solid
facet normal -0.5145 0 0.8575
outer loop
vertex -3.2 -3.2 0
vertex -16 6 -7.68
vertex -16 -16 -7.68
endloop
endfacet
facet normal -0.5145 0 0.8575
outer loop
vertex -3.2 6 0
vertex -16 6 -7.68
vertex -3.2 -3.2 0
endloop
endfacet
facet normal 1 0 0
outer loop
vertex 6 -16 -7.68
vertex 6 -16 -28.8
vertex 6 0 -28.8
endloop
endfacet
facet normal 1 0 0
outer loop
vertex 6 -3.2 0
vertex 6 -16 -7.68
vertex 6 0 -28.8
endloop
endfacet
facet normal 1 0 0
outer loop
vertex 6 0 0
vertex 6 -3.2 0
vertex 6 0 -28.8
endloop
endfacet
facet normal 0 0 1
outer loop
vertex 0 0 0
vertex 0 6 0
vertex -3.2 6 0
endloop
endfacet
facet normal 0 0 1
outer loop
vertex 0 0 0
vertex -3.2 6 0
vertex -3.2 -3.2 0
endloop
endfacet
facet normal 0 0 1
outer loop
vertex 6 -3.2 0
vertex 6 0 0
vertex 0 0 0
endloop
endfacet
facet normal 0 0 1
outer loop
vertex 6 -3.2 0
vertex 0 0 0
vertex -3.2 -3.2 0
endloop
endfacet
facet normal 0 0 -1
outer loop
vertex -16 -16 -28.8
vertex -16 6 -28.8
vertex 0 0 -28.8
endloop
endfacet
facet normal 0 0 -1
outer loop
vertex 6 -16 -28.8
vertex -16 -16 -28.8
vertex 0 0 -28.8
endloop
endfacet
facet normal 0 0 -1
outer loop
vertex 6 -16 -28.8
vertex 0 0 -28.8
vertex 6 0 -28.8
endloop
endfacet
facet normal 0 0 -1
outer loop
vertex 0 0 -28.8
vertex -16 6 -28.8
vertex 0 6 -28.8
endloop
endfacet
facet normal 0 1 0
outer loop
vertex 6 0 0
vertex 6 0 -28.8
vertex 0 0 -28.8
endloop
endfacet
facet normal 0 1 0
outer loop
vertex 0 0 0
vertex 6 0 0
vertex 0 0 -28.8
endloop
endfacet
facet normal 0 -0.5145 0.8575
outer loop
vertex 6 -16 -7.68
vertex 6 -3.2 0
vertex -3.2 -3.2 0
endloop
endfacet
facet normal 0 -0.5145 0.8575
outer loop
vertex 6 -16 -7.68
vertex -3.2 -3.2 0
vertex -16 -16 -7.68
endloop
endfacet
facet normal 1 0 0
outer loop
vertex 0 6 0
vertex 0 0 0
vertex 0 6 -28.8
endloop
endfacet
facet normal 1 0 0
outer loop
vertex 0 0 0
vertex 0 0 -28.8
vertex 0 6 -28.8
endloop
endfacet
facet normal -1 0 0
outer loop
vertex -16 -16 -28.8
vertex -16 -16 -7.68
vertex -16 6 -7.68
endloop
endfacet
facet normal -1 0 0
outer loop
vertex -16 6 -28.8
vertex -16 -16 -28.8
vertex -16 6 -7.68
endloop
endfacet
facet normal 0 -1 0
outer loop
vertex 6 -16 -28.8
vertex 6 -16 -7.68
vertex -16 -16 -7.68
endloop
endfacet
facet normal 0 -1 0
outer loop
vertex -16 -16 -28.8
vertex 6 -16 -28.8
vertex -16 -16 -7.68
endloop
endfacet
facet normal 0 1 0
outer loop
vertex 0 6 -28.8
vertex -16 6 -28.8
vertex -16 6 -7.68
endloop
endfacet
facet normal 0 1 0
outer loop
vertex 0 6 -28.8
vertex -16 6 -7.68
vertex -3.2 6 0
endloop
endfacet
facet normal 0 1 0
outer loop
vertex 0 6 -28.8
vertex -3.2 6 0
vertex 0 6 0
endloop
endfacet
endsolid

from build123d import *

# Parameters (mm, degrees)
PAD014_DEPTH    = 28.8
POCKET011_DEPTH = 24
POCKET012_DEPTH = 24
SKETCH112_W     = 2
SKETCH112_H     = 16
POCKET028_DEPTH = 30
PAD141_DEPTH    = 22
PAD142_DEPTH    = 24
POCKET056_DEPTH = 24
POCKET057_DEPTH = 23
SKETCH194_W     = 16
SKETCH194_H     = 2
POCKET076_DEPTH = 30


with BuildPart() as part:
    # Sketch025 (on Face52 of Binder010) → Pad014 (new body)
    with BuildSketch(Plane.XY.offset(-28.8)):
        Polygon((0, 0), (0, 8), (-16, 8), (-16, -16), (8, -16), (8, 0), align=None)
    extrude(amount=PAD014_DEPTH)

    # Sketch026 (on Face5 of Pad014) → Pocket011 (cut)
    with BuildSketch(Plane.YZ.offset(8)):
        Polygon((-16, -9.6), (0, 0), (-16, 0), align=None)
    extrude(amount=-POCKET011_DEPTH, mode=Mode.SUBTRACT)

    # Sketch027 (on Face3 of Pocket011) → Pocket012 (cut)
    with BuildSketch(Plane(origin=(0, 8, 0), x_dir=(-1, 0, 0), z_dir=(0, 1, 0))):
        Polygon((16, -9.6), (0, 0), (16, 0), align=None)
    extrude(amount=-POCKET012_DEPTH, mode=Mode.SUBTRACT)

    # Sketch112 (on Face4 of Pocket012) → Pocket028 (cut)
    with BuildSketch(Plane(origin=(0, 0, -28.8), x_dir=(1, 0, 0), z_dir=(0, 0, -1))):
        with Locations((7, 8)):
            Rectangle(SKETCH112_W, SKETCH112_H)
    extrude(amount=-POCKET028_DEPTH, mode=Mode.SUBTRACT)

    # Sketch137 (on Face7 of Pocket028) → Pad141 (join)
    with BuildSketch(Plane.YZ.offset(6)):
        Polygon((0, 0), (-3.2, 0), (-16, -7.68), (-16, -10.88), (-3.2, -3.2), (0, -3.2), align=None)
    extrude(amount=-PAD141_DEPTH)

    # Sketch167 → Pad142 (join)
    with BuildSketch(Plane(origin=(0, 8, 0), x_dir=(-1, 0, 0), z_dir=(0, 1, 0))):
        Polygon((0, 0), (0, -3.2), (3.2, -3.2), (16, -10.88), (16, -7.68), (3.2, 0), align=None)
    extrude(amount=-PAD142_DEPTH)

    # Sketch170 (on Face9 of Pad142) → Pocket056 (cut)
    with BuildSketch(Plane(origin=(0, 8, 0), x_dir=(-1, 0, 0), z_dir=(0, 1, 0))):
        Polygon((3.2, 0), (16, -7.68), (16, 0), align=None)
    extrude(amount=-POCKET056_DEPTH, mode=Mode.SUBTRACT)

    # Sketch171 (on Face3 of Pocket056) → Pocket057 (cut)
    with BuildSketch(Plane.YZ.offset(6)):
        Polygon((-3.2, 0), (-16, -7.68), (-16, 0), align=None)
    extrude(amount=-POCKET057_DEPTH, mode=Mode.SUBTRACT)

    # Sketch194 (on Face1 of Pocket057) → Pocket076 (cut)
    with BuildSketch(Plane(origin=(0, 0, -28.8), x_dir=(1, 0, 0), z_dir=(0, 0, -1))):
        with Locations((-8, -7)):
            Rectangle(SKETCH194_W, SKETCH194_H)
    extrude(amount=-POCKET076_DEPTH, mode=Mode.SUBTRACT)


solid = part.part
